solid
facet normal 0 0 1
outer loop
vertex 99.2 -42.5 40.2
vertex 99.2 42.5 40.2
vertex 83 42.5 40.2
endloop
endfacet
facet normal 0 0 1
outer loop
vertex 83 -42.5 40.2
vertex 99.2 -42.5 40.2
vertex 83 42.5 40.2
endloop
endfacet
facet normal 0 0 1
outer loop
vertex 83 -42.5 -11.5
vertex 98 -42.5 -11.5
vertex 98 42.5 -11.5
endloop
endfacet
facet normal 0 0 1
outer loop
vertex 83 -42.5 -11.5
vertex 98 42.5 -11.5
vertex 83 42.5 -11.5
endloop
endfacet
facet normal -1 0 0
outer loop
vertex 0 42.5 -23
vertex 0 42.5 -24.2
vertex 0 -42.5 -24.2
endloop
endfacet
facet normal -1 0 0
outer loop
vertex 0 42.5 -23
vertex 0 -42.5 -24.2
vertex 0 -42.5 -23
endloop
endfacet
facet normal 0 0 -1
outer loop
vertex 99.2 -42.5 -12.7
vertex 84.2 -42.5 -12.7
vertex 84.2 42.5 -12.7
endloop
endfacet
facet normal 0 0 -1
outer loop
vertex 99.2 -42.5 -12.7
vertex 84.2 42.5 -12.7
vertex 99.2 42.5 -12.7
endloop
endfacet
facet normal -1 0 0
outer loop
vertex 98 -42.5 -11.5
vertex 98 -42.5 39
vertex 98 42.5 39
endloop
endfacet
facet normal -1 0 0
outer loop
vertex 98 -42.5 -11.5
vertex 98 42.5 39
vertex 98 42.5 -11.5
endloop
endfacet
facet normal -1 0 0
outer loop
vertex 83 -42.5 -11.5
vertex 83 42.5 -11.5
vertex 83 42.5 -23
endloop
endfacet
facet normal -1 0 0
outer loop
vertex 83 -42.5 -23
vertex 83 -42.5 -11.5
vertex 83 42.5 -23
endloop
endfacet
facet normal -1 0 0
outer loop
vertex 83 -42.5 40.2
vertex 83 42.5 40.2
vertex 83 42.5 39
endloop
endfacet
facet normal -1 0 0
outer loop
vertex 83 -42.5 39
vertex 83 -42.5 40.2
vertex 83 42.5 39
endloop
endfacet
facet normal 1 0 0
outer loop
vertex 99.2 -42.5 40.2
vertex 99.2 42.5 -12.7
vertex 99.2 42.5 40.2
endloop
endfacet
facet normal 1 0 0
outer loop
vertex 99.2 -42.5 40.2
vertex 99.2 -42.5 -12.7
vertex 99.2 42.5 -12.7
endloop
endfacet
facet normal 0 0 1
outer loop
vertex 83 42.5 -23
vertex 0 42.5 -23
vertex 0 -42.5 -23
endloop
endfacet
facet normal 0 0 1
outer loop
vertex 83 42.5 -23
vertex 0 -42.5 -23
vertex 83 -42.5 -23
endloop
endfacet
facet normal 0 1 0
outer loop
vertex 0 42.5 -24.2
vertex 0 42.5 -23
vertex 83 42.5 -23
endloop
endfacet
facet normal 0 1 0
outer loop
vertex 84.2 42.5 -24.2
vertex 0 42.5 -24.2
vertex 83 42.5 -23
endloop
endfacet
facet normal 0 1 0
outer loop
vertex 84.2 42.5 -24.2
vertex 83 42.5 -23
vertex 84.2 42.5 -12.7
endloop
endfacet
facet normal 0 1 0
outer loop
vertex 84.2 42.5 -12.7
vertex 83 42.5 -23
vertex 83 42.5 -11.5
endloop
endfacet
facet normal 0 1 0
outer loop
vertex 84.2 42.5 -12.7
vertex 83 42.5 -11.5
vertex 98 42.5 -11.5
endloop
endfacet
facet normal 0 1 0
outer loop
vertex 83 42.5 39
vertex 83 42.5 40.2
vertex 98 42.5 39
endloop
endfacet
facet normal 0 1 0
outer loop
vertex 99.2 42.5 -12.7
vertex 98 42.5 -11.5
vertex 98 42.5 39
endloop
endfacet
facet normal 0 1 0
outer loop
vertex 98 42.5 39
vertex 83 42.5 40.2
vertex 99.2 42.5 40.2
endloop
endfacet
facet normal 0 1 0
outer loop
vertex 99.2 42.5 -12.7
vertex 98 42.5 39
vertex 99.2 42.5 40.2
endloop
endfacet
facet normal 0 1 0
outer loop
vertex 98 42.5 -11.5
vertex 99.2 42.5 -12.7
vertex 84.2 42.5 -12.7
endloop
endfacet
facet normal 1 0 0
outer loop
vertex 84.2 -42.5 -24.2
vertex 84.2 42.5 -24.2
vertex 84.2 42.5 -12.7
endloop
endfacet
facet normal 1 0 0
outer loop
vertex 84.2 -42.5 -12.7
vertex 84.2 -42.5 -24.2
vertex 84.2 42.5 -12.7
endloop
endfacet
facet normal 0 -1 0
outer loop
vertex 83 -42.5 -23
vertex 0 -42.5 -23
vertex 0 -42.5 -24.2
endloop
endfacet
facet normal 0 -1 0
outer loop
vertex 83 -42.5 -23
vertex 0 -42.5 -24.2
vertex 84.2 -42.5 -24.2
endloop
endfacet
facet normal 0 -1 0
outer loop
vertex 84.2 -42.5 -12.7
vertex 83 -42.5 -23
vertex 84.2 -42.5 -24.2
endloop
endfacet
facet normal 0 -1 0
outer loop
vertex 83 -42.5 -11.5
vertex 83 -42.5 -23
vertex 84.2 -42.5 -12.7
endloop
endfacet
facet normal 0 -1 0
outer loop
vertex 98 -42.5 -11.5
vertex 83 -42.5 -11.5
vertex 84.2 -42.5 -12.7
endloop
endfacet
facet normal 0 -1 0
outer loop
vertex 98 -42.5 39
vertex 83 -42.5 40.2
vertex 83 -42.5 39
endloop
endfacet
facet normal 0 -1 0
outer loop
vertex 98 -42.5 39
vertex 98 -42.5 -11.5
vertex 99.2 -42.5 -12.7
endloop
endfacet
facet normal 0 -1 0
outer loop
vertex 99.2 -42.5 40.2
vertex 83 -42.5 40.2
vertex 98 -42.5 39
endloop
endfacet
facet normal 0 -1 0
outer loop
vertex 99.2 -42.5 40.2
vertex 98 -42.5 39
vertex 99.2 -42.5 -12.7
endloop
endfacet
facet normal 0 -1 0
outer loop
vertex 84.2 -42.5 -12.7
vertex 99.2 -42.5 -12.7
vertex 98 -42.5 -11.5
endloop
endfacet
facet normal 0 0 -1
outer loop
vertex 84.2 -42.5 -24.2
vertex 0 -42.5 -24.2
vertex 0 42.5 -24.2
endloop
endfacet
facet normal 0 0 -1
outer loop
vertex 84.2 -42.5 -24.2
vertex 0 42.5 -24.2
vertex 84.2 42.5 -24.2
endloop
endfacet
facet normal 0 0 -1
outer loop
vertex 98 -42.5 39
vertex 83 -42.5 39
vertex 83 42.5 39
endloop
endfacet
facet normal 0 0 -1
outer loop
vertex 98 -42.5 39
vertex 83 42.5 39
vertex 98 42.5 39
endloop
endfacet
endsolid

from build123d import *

# Parameters (mm, degrees)
F1_DEPTH = 33.5
F2_W     = 83
F2_H     = 1.2
F3_DEPTH = 42.5
F5_DEPTH = 76.001
F7_DEPTH = 76.001


with BuildPart() as f1:
    # F0 (on Front) → F1 (new body, symmetric)
    with BuildSketch(Plane.XZ):
        Polygon((83, 0), (0, 0), (0, -23), (83, -23), (83, -11.5), align=None)
        Polygon((83, 39), (83, 0), (83, -11.5), (98, -11.5), (98, 39), align=None)
    extrude(amount=F1_DEPTH, both=True)

    # F2 (on Front) → F3 (join, symmetric)
    with BuildSketch(Plane.XZ):
        Polygon((83, 40.2), (83, 39), (98, 39), (99.2, 39), (99.2, 40.2), align=None)
        Polygon((99.2, 39), (98, 39), (98, -11.5), (98, -12.7), (99.2, -12.7), align=None)
        with Locations((41.5, -23.6)):
            Rectangle(F2_W, F2_H)
        Polygon((83, -12.7), (83, -23), (83, -24.2), (84.2, -24.2), (84.2, -12.7), align=None)
        Polygon((98, -12.7), (98, -11.5), (83, -11.5), (83, -12.7), (84.2, -12.7), align=None)
    extrude(amount=F3_DEPTH, both=True)

    # F4 (on face) → F5 (cut, through all)
    with BuildSketch(Plane.XZ.offset(33.5)):
        Polygon((21, -21), (2, -2), (2, -21), align=None)
        Polygon((21.848528, -20.151472), (40, -2), (3.697056, -2), align=None)
        Polygon((40.848528, -2.848528), (22.697056, -21), (59, -21), align=None)
        Polygon((59.848528, -20.151472), (78, -2), (41.697056, -2), align=None)
        Polygon((81, -9.5), (85.5, -9.5), (78.848528, -2.848528), (60.697056, -21), (81, -21), align=None)
        Polygon((96, -9.5), (96, 0), (86.286385, -8.788509), (86.997877, -9.5), align=None)
        Polygon((96, 2.302944), (85, 13.302944), (85, -2), (79.497877, -2), (85.436797, -7.93892), (96, 1.618263), align=None)
        Polygon((96, 4), (96, 24.302944), (85.848528, 14.151472), align=None)
        Polygon((95.151472, 25.151472), (85, 35.302944), (85, 15), align=None)
        Polygon((96, 37), (85, 37), (96, 26), align=None)
    extrude(amount=-F5_DEPTH, mode=Mode.SUBTRACT)

    # F6 (on face) → F7 (cut, through all)
    with BuildSketch(Plane.XZ.offset(33.5)):
        Polygon((83, 39), (83, 0), (0, 0), (0, -23), (83, -23), (83, -11.5), (98, -11.5), (98, 39), align=None)
    extrude(amount=-F7_DEPTH, mode=Mode.SUBTRACT)


solid = f1.part
